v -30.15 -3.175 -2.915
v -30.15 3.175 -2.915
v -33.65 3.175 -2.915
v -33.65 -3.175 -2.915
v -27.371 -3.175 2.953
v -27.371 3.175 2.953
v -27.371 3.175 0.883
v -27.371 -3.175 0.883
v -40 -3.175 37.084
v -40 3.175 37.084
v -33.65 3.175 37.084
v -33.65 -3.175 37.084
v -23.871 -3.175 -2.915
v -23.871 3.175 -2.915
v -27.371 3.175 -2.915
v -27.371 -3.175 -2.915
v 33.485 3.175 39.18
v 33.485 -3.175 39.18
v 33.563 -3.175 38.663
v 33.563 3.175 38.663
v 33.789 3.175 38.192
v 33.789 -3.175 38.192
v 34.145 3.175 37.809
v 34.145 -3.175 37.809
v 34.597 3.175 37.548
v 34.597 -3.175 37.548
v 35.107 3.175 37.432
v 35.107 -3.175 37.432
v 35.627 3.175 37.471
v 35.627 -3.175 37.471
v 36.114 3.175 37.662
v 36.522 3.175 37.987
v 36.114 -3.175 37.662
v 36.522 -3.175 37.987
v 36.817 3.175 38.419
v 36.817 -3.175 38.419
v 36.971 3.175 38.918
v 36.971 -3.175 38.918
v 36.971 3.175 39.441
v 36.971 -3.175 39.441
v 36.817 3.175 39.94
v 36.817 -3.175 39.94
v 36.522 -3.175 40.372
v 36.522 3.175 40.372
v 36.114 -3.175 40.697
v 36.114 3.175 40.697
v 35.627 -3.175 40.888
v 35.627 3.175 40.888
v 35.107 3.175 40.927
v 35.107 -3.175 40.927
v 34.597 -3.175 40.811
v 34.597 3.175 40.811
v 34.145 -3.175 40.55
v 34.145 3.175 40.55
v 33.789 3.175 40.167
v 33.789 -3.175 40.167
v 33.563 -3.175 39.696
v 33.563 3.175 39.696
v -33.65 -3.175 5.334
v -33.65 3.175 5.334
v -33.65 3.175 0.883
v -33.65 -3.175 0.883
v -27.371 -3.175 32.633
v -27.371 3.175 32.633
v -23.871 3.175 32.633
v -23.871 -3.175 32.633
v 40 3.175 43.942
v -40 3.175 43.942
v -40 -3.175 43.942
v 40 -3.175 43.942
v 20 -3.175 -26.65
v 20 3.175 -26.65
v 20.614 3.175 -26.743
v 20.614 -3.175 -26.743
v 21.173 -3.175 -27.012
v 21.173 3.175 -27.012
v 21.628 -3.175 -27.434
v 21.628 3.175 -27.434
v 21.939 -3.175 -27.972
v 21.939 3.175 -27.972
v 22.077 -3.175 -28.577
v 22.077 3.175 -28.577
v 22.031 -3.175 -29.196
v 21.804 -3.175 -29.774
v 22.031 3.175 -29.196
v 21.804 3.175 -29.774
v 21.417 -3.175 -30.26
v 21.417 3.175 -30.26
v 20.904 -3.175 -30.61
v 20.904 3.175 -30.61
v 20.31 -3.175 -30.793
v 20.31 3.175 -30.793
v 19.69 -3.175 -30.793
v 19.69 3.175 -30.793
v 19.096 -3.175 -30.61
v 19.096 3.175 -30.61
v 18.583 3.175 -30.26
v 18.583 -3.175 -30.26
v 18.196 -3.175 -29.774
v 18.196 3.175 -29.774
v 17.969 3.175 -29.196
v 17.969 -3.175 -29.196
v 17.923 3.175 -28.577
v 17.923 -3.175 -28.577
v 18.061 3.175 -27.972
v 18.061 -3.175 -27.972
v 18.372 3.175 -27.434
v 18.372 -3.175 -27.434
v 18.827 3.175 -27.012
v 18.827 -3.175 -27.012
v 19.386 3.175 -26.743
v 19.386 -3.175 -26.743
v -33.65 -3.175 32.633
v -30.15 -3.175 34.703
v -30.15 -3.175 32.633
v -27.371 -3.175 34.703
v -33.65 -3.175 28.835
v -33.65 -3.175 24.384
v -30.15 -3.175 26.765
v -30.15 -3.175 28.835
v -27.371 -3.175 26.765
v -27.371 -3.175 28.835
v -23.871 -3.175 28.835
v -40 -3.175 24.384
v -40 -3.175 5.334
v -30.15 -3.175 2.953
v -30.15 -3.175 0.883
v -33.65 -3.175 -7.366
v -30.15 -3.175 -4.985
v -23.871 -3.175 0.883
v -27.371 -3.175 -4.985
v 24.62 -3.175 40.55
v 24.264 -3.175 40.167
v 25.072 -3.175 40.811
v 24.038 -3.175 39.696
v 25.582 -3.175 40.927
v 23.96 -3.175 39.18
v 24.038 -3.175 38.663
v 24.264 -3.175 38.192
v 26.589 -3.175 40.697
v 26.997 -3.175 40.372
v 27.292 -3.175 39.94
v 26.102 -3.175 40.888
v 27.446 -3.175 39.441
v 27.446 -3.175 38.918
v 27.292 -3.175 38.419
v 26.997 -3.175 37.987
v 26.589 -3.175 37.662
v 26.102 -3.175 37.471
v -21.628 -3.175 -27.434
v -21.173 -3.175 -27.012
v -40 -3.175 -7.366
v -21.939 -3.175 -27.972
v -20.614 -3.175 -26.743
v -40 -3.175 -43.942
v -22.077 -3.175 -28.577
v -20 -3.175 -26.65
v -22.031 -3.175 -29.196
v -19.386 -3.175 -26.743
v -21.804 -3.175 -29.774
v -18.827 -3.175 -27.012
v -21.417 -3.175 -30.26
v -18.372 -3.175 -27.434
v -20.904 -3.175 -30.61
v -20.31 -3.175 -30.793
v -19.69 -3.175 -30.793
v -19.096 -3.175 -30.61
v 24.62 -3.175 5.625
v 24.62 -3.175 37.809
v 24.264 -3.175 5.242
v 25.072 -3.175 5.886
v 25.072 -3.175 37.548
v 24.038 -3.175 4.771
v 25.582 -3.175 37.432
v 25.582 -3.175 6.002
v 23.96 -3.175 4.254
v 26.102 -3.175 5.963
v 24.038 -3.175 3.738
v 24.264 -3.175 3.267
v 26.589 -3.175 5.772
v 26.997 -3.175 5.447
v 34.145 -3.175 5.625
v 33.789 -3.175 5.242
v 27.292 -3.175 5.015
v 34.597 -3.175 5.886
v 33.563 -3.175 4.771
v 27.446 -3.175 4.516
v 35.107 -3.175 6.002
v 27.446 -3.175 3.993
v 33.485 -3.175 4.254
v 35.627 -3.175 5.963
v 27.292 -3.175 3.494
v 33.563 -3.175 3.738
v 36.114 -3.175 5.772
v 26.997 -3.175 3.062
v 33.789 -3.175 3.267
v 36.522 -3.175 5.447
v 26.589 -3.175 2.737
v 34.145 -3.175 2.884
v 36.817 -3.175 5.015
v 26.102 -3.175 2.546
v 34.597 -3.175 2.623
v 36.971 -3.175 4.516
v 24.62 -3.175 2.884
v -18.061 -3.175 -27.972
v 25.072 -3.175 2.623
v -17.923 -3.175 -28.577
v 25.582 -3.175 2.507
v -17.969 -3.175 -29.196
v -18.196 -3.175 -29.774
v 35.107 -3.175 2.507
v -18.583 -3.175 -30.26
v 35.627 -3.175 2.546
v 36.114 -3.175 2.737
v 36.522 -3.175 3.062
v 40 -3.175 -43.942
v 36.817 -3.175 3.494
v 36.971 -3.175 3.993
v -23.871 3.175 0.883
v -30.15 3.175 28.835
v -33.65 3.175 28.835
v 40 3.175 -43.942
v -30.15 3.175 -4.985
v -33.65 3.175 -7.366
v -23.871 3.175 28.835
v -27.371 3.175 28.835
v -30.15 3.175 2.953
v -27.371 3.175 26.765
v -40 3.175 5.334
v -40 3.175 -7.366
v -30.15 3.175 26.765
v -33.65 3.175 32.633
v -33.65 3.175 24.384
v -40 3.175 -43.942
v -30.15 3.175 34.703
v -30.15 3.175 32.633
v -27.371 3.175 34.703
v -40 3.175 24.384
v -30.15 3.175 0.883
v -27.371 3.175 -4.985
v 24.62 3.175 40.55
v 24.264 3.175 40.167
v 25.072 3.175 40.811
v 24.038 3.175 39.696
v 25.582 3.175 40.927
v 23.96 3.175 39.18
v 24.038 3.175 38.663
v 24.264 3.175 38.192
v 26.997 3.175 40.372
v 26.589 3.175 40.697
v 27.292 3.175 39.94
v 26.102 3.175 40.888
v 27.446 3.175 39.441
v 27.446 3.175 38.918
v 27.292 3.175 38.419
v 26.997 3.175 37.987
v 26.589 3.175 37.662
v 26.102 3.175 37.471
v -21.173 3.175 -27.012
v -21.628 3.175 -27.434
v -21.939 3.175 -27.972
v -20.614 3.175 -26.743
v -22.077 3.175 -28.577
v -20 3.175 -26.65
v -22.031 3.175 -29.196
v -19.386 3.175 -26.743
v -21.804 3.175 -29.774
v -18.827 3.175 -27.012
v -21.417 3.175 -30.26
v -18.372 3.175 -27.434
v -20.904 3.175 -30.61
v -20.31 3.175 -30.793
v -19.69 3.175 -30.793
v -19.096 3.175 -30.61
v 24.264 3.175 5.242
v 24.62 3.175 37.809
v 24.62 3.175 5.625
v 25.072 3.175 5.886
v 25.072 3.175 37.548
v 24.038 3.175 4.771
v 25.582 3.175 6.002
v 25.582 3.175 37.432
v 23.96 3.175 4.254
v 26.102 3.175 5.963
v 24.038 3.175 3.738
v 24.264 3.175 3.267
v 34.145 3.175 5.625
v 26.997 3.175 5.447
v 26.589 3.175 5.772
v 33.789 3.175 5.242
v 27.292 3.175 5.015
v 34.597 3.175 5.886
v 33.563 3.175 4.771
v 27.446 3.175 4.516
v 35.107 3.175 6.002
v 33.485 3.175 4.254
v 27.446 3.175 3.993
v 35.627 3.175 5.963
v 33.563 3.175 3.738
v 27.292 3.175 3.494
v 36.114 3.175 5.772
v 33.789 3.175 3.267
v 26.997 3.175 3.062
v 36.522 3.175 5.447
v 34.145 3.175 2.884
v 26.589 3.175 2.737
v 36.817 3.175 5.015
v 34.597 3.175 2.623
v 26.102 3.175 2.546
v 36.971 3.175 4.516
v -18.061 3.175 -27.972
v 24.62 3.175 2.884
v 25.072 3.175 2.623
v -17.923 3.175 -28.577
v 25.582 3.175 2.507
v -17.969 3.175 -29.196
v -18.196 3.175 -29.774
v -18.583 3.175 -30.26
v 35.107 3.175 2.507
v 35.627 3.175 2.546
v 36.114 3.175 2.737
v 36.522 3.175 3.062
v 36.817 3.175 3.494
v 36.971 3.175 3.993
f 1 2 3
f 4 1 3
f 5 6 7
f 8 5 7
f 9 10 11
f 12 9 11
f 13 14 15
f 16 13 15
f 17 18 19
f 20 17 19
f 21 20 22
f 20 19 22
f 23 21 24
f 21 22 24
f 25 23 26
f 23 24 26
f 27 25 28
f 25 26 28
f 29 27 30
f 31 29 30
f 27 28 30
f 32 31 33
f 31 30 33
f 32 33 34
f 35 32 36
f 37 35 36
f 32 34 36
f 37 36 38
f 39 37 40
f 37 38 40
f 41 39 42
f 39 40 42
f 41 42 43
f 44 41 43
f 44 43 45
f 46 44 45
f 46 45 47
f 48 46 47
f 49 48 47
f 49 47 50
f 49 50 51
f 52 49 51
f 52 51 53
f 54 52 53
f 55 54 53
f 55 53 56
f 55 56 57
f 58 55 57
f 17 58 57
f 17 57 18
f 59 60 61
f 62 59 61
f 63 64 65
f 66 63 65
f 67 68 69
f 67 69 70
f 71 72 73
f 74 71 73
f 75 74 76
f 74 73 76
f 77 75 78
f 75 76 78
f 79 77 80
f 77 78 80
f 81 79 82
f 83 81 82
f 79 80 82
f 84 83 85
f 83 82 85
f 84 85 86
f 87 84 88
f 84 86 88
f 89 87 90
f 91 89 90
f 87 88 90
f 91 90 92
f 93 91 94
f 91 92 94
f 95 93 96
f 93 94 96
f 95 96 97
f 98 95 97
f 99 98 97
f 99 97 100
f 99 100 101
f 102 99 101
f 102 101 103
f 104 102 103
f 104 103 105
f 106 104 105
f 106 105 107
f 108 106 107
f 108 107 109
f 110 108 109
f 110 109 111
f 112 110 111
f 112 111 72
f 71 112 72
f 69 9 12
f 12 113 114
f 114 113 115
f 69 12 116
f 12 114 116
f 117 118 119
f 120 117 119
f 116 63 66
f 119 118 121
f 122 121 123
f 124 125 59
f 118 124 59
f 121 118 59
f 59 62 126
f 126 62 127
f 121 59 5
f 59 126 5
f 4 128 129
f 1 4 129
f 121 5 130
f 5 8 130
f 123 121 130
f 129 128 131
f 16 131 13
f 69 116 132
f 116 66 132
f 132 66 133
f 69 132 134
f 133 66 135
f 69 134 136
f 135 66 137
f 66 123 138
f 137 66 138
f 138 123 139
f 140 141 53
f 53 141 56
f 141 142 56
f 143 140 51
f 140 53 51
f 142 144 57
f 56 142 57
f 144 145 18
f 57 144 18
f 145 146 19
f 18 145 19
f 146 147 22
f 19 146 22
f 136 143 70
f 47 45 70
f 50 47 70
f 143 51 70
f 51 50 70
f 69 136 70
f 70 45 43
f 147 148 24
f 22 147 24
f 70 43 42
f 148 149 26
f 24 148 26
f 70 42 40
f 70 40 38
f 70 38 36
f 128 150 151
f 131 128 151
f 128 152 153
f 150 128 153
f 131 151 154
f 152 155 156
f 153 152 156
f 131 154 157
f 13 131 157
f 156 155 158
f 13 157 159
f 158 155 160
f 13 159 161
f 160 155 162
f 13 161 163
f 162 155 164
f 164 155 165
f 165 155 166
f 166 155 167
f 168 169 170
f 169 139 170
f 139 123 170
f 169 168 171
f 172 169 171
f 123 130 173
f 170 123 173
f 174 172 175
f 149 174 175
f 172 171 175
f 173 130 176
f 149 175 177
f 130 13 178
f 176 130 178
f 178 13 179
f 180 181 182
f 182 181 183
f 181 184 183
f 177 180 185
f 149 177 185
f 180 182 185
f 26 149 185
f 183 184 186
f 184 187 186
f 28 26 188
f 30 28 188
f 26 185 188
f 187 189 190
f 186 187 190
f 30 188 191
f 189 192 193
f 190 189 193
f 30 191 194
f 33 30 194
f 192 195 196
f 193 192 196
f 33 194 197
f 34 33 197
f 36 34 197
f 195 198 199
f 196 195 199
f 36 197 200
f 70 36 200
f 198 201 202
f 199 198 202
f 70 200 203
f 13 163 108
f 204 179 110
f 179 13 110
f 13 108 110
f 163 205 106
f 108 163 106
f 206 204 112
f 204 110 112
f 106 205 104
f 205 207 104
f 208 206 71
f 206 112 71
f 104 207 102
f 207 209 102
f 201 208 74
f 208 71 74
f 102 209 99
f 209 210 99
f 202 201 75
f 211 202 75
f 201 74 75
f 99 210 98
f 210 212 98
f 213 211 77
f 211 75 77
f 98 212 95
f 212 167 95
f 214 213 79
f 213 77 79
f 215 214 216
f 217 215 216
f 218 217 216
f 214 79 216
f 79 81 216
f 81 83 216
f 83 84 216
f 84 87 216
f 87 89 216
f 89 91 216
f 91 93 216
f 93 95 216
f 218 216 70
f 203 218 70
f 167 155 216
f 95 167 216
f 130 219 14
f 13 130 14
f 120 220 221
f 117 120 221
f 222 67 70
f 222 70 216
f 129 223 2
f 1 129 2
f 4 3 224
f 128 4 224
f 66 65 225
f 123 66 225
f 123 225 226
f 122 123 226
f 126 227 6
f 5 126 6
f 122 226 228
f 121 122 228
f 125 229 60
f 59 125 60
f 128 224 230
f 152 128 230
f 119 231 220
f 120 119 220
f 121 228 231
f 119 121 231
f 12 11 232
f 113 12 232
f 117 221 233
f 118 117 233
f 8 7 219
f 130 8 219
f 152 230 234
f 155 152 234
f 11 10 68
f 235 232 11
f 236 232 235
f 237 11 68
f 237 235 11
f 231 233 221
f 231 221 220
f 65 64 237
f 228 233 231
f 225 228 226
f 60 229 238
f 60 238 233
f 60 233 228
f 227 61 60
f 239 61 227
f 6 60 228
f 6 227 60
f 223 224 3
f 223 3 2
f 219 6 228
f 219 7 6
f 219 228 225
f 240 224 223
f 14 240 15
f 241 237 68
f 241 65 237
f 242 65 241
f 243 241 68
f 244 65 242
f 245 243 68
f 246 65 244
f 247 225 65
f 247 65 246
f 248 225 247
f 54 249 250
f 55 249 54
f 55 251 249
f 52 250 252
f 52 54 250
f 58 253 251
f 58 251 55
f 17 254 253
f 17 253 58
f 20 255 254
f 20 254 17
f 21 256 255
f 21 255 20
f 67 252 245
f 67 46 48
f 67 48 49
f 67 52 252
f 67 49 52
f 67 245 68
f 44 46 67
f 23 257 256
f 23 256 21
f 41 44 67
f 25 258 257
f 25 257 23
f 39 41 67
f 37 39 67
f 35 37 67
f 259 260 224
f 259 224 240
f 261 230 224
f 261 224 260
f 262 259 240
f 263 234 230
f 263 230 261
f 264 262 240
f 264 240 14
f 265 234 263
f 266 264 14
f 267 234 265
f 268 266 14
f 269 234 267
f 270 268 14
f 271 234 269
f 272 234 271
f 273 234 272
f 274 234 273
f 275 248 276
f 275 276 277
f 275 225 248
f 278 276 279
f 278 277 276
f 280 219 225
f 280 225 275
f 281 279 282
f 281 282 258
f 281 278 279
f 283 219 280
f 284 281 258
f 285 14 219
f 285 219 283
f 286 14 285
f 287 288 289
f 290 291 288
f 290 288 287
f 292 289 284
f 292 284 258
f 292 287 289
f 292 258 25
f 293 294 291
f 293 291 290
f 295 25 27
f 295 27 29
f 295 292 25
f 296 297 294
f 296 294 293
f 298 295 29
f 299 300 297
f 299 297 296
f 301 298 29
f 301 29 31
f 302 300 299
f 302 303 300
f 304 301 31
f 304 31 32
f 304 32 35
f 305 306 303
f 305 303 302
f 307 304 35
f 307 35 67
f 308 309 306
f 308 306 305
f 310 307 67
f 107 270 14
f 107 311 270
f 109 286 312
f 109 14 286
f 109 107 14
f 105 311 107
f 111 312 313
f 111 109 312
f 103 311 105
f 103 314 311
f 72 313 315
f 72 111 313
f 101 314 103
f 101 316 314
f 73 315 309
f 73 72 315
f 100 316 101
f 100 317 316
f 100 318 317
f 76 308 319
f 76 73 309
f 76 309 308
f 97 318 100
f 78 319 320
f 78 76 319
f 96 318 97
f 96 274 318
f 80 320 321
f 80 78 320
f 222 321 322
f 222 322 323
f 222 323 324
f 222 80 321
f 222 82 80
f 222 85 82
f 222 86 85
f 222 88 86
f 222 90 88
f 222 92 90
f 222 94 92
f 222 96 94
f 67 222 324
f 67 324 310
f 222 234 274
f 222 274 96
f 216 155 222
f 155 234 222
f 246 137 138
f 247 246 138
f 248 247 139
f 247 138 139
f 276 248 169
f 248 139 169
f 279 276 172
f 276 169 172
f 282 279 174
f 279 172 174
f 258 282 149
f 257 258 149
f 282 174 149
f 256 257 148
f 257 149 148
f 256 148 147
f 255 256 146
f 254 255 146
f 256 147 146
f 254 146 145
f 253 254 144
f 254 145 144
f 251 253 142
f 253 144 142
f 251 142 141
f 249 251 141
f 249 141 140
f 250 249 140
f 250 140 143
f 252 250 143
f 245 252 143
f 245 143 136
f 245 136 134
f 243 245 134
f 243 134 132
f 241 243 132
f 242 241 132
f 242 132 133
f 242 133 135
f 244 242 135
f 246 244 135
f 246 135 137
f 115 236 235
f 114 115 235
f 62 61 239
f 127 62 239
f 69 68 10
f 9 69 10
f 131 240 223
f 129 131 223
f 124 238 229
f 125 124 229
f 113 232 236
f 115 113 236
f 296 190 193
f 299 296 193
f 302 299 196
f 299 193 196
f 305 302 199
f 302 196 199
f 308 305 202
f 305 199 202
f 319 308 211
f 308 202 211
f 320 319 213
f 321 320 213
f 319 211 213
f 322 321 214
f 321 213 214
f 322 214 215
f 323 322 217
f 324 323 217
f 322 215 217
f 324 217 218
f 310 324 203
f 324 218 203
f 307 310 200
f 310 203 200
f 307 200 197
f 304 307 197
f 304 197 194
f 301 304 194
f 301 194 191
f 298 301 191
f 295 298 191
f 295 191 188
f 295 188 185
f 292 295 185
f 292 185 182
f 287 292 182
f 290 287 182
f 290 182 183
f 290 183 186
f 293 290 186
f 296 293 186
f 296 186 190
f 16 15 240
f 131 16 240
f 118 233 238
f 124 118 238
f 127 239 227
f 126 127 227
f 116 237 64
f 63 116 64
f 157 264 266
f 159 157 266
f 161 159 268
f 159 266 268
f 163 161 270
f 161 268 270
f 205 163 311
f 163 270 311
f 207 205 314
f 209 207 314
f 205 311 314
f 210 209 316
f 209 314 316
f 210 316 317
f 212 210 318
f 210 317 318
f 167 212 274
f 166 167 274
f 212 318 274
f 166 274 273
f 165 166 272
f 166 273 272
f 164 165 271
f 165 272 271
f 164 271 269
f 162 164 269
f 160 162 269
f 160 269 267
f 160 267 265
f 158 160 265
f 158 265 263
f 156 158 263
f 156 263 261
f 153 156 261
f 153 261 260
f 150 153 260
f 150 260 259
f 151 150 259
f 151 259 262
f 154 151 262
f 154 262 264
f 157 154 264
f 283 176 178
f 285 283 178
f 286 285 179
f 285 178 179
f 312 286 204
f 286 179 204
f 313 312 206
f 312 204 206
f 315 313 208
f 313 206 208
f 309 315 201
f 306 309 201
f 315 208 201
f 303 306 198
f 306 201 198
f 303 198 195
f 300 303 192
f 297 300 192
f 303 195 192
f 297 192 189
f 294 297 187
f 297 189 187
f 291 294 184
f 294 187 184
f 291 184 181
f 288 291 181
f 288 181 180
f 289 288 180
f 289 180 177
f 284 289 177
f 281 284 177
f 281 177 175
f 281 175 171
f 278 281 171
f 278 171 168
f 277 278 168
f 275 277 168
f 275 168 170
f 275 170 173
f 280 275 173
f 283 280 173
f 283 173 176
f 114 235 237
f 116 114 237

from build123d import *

# Parameters (mm, degrees)
SKETCH1_W             = 80
SKETCH1_H             = 87.884
BOSS_EXTRUDE1_DEPTH   = 3.175
F_6_CLEARANCE_HOLE1_D = 3.5052
LPATTERN1_COUNT       = 2
LPATTERN1_PITCH       = 9.525
LPATTERN1_COUNT_DIR2  = 2
LPATTERN1_PITCH_DIR2  = 34.925
CUT_EXTRUDE1_REACH    = 61.76
LPATTERN3_COUNT       = 2
LPATTERN3_PITCH       = 31.75
SKETCH10_R            = 2.0828
CUT_EXTRUDE2_DEPTH    = 60.759701003


with BuildPart() as part:
    # Sketch1 → Boss-Extrude1 (new, symmetric)
    with BuildSketch(Plane(origin=(0, 0, 0), x_dir=(1, 0, 0), z_dir=(0, 1, 0))):
        Rectangle(SKETCH1_W, SKETCH1_H)
    extrude(amount=BOSS_EXTRUDE1_DEPTH, both=True)

    # #6 Clearance Hole1 (through all)
    with Locations(Plane(origin=(0, 3.175, 0), x_dir=(1, 0, 0), z_dir=(0, 1, 0))):
        with Locations((35.2375, -39.1795)):
            f_6_clearance_hole1 = Hole(F_6_CLEARANCE_HOLE1_D / 2)

    # LPattern1: 6 Clearance Hole1 2 × 2
    with Locations(*[(-i * LPATTERN1_PITCH, 0, -j * LPATTERN1_PITCH_DIR2) for i in range(LPATTERN1_COUNT) for j in range(LPATTERN1_COUNT_DIR2) if (i, j) != (0, 0)]):
        add(f_6_clearance_hole1, mode=Mode.SUBTRACT)

    # Sketch7 → Cut-Extrude1 (cut, up to next)
    with BuildSketch(Plane(origin=(0, 3.175, 0), x_dir=(1, 0, 0), z_dir=(0, 1, 0)), mode=Mode.PRIVATE) as cut_extrude1_sk1:
        Polygon((-40, 7.366), (-40, -5.334), (-33.65, -5.334), (-33.65, -0.88265), (-30.1495625, -0.88265), (-30.1495625, -2.95275), (-27.3714375, -2.95275), (-27.3714375, -0.88265), (-23.871, -0.88265), (-23.871, 2.91465), (-27.3714375, 2.91465), (-27.3714375, 4.98475), (-30.1495625, 4.98475), (-30.1495625, 2.91465), (-33.65, 2.91465), (-33.65, 7.366), align=None)
    cut_extrude1_tool1 = extrude(cut_extrude1_sk1.sketch, amount=-CUT_EXTRUDE1_REACH, mode=Mode.PRIVATE) & part.part
    cut_extrude1 = cut_extrude1_tool1.solids().sort_by_distance((-33.791113, 3.175, -1.016))[0]
    add(cut_extrude1, mode=Mode.SUBTRACT)

    # LPattern3: Cut-Extrude1 ×2
    with Locations(*[(0, 0, i * LPATTERN3_PITCH) for i in range(1, LPATTERN3_COUNT)]):
        add(cut_extrude1, mode=Mode.SUBTRACT)

    # Sketch10 → Cut-Extrude2 (cut, through all)
    with BuildSketch(Plane(origin=(0, 3.175, 0), x_dir=(1, 0, 0), z_dir=(0, 1, 0))):
        with Locations(Location((20, 28.733, 0), (0, 0, 270))):
            Circle(SKETCH10_R)
        with Locations(Location((-20, 28.733, 0), (0, 0, 270))):
            Circle(SKETCH10_R)
    extrude(amount=-CUT_EXTRUDE2_DEPTH, mode=Mode.SUBTRACT)


solid = part.part
